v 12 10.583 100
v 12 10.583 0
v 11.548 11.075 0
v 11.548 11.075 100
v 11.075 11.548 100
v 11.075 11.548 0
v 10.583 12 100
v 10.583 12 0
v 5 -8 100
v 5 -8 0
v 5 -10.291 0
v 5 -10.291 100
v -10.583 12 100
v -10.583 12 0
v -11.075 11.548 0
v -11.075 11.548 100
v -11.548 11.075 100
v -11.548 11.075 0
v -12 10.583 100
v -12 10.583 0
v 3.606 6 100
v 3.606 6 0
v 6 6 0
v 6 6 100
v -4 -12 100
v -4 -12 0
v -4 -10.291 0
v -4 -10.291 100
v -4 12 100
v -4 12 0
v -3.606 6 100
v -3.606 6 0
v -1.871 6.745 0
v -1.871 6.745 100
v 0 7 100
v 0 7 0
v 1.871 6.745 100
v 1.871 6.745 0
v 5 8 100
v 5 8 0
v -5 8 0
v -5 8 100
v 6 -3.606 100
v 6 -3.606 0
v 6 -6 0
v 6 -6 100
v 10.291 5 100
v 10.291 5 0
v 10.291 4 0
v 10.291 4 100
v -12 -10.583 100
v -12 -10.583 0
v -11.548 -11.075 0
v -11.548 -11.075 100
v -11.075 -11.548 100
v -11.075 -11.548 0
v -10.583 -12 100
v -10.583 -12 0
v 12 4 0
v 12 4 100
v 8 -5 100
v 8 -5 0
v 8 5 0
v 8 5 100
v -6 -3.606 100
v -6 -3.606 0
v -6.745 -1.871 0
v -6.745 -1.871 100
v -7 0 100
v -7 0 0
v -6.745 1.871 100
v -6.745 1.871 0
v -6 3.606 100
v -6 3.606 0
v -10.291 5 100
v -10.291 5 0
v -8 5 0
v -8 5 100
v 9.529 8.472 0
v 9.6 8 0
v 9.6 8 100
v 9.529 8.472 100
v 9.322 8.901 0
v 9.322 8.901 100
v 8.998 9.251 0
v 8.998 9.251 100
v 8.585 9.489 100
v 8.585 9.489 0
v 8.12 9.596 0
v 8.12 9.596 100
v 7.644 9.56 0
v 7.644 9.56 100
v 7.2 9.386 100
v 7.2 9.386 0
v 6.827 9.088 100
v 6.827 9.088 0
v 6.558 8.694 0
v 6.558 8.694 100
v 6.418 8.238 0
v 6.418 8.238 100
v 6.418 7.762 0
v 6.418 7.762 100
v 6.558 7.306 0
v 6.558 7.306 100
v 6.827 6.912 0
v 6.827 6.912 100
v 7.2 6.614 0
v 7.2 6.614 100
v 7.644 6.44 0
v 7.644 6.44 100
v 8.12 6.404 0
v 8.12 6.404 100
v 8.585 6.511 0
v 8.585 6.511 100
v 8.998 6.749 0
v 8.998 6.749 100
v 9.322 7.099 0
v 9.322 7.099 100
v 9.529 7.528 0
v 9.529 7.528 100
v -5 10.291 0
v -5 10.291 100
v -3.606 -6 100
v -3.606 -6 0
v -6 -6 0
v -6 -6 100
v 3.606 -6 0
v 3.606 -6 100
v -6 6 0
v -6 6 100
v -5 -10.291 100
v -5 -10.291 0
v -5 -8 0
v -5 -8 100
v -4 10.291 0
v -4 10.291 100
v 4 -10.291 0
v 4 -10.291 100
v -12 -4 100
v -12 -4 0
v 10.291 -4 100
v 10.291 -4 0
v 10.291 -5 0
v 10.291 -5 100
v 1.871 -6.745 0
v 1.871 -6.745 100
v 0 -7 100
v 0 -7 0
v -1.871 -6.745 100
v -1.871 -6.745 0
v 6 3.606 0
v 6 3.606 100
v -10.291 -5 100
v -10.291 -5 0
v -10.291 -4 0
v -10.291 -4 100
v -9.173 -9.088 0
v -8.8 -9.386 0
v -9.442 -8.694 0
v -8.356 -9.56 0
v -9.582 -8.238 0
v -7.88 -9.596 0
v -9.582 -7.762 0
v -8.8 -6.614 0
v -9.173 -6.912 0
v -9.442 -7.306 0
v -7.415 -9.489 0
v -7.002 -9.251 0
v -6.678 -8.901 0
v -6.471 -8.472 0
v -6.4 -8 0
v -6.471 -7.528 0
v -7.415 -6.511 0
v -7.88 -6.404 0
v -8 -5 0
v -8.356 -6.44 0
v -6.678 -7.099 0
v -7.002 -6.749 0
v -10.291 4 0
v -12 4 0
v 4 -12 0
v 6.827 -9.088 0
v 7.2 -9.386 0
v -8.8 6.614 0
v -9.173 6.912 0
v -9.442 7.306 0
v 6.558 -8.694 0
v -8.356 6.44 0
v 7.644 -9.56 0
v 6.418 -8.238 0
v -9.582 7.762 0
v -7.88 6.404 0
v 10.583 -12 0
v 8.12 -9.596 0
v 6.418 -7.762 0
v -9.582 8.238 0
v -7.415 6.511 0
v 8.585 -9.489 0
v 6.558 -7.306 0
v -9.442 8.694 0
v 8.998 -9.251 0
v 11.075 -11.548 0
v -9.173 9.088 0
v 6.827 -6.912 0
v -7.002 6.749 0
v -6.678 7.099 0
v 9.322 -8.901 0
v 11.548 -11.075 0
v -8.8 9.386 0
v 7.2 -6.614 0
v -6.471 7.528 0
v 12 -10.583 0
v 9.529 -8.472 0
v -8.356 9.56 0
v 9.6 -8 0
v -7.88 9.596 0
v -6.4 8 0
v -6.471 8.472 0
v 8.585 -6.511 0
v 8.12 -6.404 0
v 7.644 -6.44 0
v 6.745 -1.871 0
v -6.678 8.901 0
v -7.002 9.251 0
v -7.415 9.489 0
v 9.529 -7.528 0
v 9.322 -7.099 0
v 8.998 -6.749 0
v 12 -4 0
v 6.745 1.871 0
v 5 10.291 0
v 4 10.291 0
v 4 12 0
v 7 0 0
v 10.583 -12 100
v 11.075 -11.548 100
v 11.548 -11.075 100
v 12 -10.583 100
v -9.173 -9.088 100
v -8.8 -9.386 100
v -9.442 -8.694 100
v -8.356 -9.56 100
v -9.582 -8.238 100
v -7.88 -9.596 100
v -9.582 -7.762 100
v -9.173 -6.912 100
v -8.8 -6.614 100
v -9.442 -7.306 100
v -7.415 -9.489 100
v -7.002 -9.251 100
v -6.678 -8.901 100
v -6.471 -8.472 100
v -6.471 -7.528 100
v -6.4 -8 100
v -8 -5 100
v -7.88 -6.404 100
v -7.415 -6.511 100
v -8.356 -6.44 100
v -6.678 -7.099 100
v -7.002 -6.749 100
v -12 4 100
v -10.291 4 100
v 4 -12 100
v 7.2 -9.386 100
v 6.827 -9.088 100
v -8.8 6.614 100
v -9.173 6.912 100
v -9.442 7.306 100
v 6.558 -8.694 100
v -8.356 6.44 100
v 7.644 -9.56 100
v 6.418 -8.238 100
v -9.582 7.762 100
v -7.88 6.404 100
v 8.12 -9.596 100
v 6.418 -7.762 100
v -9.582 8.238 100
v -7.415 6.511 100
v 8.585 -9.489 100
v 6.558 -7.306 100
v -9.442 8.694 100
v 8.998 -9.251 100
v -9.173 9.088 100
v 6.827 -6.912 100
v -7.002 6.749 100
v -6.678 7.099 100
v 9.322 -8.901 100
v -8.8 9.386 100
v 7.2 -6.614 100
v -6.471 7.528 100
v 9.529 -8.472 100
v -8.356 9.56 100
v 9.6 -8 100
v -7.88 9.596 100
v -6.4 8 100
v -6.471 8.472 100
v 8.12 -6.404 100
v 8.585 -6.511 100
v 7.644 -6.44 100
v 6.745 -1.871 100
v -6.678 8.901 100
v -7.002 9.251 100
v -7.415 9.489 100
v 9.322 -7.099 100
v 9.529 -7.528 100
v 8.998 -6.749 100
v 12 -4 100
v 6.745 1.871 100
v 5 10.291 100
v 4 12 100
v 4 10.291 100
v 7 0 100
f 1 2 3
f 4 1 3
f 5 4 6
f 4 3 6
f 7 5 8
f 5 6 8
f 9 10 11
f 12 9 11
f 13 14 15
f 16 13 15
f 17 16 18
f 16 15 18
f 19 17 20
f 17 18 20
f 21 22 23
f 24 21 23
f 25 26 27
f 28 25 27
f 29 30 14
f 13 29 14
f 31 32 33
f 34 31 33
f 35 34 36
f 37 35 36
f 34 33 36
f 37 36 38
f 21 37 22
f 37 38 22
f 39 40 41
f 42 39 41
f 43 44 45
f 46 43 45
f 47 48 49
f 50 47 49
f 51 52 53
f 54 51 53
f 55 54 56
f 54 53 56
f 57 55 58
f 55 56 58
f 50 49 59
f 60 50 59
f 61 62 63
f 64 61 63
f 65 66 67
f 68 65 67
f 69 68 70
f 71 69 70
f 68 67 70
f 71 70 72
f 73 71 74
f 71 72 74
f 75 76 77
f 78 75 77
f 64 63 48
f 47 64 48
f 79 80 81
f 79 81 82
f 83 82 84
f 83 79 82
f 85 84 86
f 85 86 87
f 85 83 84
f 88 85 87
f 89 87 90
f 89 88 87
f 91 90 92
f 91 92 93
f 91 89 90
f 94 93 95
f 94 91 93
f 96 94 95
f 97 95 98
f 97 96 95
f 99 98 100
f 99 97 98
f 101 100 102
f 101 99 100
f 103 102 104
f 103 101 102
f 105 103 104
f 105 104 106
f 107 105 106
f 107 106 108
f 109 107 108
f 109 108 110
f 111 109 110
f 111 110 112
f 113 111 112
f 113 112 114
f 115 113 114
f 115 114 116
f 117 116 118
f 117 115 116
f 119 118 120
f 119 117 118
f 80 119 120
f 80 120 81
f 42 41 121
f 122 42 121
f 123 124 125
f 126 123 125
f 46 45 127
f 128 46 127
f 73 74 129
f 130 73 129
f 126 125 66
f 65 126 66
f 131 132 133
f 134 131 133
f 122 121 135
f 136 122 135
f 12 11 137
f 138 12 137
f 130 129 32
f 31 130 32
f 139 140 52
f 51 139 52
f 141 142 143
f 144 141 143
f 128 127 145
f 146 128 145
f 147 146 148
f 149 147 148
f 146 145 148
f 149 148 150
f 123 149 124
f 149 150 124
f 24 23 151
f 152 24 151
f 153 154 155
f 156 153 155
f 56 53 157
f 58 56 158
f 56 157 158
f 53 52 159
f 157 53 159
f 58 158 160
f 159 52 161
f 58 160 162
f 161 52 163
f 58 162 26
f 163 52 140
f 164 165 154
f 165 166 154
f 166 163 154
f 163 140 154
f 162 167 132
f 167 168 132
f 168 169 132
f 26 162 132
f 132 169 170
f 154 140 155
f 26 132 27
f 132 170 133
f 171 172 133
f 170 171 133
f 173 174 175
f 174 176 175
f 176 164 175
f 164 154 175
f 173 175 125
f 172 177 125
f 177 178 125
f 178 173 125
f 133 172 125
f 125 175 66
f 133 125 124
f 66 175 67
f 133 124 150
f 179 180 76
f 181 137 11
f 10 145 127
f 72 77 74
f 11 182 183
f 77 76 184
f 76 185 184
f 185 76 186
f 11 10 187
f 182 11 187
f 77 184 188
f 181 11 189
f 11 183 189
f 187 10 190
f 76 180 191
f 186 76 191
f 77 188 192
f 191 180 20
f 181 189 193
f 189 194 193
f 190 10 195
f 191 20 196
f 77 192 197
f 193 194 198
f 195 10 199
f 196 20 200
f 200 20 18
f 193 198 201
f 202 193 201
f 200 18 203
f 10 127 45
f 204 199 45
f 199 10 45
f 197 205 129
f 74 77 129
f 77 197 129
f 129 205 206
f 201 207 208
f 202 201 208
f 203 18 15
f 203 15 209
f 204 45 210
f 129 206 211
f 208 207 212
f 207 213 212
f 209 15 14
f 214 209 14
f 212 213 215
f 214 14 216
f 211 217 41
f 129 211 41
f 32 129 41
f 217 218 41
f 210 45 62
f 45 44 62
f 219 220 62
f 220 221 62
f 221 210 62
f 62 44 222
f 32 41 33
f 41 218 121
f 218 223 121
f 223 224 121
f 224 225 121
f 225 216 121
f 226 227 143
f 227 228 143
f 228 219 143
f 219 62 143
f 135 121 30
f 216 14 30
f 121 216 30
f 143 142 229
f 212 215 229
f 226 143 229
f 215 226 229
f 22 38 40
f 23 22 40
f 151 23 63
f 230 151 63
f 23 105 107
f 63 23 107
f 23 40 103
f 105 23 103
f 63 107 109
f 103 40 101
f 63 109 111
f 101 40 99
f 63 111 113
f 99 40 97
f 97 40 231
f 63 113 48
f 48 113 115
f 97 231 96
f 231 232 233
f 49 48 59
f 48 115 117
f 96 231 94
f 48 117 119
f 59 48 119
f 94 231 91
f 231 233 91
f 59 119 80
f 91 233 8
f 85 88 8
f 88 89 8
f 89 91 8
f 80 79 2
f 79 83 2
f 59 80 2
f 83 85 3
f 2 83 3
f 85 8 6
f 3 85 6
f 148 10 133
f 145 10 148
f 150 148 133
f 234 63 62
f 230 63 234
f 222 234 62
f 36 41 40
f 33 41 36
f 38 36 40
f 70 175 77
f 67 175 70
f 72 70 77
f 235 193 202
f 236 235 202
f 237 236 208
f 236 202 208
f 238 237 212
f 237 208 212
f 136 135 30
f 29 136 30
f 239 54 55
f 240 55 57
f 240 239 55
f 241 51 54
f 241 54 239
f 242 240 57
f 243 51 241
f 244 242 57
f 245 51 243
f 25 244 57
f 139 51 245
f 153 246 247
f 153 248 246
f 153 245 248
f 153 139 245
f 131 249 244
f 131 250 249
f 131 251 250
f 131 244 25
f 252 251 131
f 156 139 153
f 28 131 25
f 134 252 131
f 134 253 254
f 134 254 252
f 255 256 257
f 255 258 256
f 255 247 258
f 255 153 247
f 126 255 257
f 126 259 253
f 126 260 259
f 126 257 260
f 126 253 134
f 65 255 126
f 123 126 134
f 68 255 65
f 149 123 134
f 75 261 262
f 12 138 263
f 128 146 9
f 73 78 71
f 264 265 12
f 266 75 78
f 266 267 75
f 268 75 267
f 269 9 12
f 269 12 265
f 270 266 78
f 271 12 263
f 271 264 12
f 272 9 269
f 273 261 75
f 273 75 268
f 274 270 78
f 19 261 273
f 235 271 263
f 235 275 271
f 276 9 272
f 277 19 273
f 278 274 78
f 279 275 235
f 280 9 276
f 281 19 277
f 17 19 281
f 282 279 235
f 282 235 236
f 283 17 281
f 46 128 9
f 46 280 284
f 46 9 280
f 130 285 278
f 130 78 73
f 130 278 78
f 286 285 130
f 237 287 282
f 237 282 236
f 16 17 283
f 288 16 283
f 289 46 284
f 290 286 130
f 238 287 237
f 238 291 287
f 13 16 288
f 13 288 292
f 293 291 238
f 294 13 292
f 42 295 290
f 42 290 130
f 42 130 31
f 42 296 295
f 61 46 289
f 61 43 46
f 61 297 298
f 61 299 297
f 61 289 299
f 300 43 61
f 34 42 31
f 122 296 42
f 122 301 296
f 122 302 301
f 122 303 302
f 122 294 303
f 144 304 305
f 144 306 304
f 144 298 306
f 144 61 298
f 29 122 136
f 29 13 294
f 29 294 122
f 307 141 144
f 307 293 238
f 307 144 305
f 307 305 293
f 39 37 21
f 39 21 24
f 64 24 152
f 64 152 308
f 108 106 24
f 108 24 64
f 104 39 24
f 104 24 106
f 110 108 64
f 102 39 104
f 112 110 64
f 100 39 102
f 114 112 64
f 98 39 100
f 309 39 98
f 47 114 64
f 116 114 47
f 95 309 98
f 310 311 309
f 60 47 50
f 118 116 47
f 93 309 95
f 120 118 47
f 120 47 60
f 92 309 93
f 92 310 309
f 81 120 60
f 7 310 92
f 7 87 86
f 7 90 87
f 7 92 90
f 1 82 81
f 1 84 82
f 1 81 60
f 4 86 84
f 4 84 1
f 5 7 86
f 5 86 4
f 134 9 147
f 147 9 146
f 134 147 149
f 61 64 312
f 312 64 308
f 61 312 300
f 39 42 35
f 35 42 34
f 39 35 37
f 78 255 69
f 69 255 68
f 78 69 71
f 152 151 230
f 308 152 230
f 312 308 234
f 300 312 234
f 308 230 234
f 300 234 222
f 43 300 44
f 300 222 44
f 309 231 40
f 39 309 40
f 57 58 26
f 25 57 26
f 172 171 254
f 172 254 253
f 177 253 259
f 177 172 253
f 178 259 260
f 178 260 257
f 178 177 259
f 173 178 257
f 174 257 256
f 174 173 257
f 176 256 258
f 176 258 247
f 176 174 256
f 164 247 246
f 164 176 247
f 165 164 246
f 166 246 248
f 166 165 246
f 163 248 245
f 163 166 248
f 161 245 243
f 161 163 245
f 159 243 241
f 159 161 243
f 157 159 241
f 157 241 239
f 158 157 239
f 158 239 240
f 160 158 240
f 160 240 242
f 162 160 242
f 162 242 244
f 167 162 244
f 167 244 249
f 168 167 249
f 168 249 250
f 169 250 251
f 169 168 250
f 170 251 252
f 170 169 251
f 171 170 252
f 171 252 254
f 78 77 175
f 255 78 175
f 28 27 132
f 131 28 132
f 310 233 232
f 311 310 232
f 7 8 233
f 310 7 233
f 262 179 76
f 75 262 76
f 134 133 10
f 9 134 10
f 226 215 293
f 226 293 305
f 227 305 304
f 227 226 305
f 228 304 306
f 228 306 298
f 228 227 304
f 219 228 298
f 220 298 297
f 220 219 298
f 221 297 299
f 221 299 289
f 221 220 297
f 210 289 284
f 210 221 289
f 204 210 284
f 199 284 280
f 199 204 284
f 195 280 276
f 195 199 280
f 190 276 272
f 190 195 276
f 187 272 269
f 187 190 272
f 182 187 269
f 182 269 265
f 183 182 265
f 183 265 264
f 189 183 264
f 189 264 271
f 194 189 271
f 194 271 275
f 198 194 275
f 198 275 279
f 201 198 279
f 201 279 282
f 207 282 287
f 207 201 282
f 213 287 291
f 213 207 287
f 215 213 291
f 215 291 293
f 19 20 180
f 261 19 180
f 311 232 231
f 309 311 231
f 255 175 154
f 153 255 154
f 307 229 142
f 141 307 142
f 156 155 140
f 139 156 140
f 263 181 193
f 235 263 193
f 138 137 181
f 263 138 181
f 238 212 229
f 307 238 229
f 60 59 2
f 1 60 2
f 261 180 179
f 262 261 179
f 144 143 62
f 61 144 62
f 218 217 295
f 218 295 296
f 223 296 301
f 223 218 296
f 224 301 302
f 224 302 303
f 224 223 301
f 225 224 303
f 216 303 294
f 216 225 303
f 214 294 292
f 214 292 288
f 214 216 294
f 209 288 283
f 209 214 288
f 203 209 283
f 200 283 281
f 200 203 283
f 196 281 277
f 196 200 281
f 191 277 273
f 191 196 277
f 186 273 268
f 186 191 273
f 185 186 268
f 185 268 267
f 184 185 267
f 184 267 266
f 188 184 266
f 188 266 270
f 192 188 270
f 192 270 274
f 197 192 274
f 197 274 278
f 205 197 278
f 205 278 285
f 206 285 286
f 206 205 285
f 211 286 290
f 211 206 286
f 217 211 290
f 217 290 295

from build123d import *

# Parameters (mm, degrees)
SKETCH1_R           = 1.6
BOSS_EXTRUDE1_DEPTH = 100


with BuildPart() as part:
    # Sketch1 → Boss-Extrude1 (new body)
    with BuildSketch(Plane.XY):
        with BuildLine():
            Line((-8, -5), (-10.291177135, -5))
            Line((-10.291177135, -5), (-10.291177135, -4))
            Line((-10.291177135, -4), (-12, -4))
            Line((-12, -4), (-12, -10.583005244))
            ThreePointArc((-12, -10.583005244), (-11.313708499, -11.313708499), (-10.583005244, -12))
            Line((-10.583005244, -12), (-4, -12))
            Line((-4, -12), (-4, -10.291177135))
            Line((-4, -10.291177135), (-5, -10.291177135))
            Line((-5, -10.291177135), (-5, -8))
            Line((-5, -8), (5, -8))
            Line((5, -8), (5, -10.291177135))
            Line((5, -10.291177135), (4, -10.291177135))
            Line((4, -10.291177135), (4, -12))
            Line((4, -12), (10.583005244, -12))
            ThreePointArc((10.583005244, -12), (11.313708499, -11.313708499), (12, -10.583005244))
            Line((12, -10.583005244), (12, -4))
            Line((12, -4), (10.291177135, -4))
            Line((10.291177135, -4), (10.291177135, -5))
            Line((10.291177135, -5), (8, -5))
            Line((8, -5), (8, 5))
            Line((8, 5), (10.291177135, 5))
            Line((10.291177135, 5), (10.291177135, 4))
            Line((10.291177135, 4), (12, 4))
            Line((12, 4), (12, 10.583005244))
            ThreePointArc((12, 10.583005244), (11.313708499, 11.313708499), (10.583005244, 12))
            Line((10.583005244, 12), (4, 12))
            Line((4, 12), (4, 10.291177135))
            Line((4, 10.291177135), (5, 10.291177135))
            Line((5, 10.291177135), (5, 8))
            Line((5, 8), (-5, 8))
            Line((-5, 8), (-5, 10.291177135))
            Line((-5, 10.291177135), (-4, 10.291177135))
            Line((-4, 10.291177135), (-4, 12))
            Line((-4, 12), (-10.583005244, 12))
            ThreePointArc((-10.583005244, 12), (-11.313708499, 11.313708499), (-12, 10.583005244))
            Line((-12, 10.583005244), (-12, 4))
            Line((-12, 4), (-10.291177135, 4))
            Line((-10.291177135, 4), (-10.291177135, 5))
            Line((-10.291177135, 5), (-8, 5))
            Line((-8, 5), (-8, -5))
        make_face()
        with Locations((-8, -8)):
            Circle(SKETCH1_R, mode=Mode.SUBTRACT)
        with Locations((8, 8)):
            Circle(SKETCH1_R, mode=Mode.SUBTRACT)
        with Locations((-8, 8)):
            Circle(SKETCH1_R, mode=Mode.SUBTRACT)
        with Locations((8, -8)):
            Circle(SKETCH1_R, mode=Mode.SUBTRACT)
        with BuildLine():
            Line((-3.605551275, -6), (-6, -6))
            Line((-6, -6), (-6, -3.605551275))
            ThreePointArc((-6, -3.605551275), (-7, 0), (-6, 3.605551275))
            Line((-6, 3.605551275), (-6, 6))
            Line((-6, 6), (-3.605551275, 6))
            ThreePointArc((-3.605551275, 6), (0, 7), (3.605551275, 6))
            Line((3.605551275, 6), (6, 6))
            Line((6, 6), (6, 3.605551275))
            ThreePointArc((6, 3.605551275), (7, 0), (6, -3.605551275))
            Line((6, -3.605551275), (6, -6))
            Line((6, -6), (3.605551275, -6))
            ThreePointArc((3.605551275, -6), (0, -7), (-3.605551275, -6))
        make_face(mode=Mode.SUBTRACT)
    extrude(amount=BOSS_EXTRUDE1_DEPTH)


solid = part.part
